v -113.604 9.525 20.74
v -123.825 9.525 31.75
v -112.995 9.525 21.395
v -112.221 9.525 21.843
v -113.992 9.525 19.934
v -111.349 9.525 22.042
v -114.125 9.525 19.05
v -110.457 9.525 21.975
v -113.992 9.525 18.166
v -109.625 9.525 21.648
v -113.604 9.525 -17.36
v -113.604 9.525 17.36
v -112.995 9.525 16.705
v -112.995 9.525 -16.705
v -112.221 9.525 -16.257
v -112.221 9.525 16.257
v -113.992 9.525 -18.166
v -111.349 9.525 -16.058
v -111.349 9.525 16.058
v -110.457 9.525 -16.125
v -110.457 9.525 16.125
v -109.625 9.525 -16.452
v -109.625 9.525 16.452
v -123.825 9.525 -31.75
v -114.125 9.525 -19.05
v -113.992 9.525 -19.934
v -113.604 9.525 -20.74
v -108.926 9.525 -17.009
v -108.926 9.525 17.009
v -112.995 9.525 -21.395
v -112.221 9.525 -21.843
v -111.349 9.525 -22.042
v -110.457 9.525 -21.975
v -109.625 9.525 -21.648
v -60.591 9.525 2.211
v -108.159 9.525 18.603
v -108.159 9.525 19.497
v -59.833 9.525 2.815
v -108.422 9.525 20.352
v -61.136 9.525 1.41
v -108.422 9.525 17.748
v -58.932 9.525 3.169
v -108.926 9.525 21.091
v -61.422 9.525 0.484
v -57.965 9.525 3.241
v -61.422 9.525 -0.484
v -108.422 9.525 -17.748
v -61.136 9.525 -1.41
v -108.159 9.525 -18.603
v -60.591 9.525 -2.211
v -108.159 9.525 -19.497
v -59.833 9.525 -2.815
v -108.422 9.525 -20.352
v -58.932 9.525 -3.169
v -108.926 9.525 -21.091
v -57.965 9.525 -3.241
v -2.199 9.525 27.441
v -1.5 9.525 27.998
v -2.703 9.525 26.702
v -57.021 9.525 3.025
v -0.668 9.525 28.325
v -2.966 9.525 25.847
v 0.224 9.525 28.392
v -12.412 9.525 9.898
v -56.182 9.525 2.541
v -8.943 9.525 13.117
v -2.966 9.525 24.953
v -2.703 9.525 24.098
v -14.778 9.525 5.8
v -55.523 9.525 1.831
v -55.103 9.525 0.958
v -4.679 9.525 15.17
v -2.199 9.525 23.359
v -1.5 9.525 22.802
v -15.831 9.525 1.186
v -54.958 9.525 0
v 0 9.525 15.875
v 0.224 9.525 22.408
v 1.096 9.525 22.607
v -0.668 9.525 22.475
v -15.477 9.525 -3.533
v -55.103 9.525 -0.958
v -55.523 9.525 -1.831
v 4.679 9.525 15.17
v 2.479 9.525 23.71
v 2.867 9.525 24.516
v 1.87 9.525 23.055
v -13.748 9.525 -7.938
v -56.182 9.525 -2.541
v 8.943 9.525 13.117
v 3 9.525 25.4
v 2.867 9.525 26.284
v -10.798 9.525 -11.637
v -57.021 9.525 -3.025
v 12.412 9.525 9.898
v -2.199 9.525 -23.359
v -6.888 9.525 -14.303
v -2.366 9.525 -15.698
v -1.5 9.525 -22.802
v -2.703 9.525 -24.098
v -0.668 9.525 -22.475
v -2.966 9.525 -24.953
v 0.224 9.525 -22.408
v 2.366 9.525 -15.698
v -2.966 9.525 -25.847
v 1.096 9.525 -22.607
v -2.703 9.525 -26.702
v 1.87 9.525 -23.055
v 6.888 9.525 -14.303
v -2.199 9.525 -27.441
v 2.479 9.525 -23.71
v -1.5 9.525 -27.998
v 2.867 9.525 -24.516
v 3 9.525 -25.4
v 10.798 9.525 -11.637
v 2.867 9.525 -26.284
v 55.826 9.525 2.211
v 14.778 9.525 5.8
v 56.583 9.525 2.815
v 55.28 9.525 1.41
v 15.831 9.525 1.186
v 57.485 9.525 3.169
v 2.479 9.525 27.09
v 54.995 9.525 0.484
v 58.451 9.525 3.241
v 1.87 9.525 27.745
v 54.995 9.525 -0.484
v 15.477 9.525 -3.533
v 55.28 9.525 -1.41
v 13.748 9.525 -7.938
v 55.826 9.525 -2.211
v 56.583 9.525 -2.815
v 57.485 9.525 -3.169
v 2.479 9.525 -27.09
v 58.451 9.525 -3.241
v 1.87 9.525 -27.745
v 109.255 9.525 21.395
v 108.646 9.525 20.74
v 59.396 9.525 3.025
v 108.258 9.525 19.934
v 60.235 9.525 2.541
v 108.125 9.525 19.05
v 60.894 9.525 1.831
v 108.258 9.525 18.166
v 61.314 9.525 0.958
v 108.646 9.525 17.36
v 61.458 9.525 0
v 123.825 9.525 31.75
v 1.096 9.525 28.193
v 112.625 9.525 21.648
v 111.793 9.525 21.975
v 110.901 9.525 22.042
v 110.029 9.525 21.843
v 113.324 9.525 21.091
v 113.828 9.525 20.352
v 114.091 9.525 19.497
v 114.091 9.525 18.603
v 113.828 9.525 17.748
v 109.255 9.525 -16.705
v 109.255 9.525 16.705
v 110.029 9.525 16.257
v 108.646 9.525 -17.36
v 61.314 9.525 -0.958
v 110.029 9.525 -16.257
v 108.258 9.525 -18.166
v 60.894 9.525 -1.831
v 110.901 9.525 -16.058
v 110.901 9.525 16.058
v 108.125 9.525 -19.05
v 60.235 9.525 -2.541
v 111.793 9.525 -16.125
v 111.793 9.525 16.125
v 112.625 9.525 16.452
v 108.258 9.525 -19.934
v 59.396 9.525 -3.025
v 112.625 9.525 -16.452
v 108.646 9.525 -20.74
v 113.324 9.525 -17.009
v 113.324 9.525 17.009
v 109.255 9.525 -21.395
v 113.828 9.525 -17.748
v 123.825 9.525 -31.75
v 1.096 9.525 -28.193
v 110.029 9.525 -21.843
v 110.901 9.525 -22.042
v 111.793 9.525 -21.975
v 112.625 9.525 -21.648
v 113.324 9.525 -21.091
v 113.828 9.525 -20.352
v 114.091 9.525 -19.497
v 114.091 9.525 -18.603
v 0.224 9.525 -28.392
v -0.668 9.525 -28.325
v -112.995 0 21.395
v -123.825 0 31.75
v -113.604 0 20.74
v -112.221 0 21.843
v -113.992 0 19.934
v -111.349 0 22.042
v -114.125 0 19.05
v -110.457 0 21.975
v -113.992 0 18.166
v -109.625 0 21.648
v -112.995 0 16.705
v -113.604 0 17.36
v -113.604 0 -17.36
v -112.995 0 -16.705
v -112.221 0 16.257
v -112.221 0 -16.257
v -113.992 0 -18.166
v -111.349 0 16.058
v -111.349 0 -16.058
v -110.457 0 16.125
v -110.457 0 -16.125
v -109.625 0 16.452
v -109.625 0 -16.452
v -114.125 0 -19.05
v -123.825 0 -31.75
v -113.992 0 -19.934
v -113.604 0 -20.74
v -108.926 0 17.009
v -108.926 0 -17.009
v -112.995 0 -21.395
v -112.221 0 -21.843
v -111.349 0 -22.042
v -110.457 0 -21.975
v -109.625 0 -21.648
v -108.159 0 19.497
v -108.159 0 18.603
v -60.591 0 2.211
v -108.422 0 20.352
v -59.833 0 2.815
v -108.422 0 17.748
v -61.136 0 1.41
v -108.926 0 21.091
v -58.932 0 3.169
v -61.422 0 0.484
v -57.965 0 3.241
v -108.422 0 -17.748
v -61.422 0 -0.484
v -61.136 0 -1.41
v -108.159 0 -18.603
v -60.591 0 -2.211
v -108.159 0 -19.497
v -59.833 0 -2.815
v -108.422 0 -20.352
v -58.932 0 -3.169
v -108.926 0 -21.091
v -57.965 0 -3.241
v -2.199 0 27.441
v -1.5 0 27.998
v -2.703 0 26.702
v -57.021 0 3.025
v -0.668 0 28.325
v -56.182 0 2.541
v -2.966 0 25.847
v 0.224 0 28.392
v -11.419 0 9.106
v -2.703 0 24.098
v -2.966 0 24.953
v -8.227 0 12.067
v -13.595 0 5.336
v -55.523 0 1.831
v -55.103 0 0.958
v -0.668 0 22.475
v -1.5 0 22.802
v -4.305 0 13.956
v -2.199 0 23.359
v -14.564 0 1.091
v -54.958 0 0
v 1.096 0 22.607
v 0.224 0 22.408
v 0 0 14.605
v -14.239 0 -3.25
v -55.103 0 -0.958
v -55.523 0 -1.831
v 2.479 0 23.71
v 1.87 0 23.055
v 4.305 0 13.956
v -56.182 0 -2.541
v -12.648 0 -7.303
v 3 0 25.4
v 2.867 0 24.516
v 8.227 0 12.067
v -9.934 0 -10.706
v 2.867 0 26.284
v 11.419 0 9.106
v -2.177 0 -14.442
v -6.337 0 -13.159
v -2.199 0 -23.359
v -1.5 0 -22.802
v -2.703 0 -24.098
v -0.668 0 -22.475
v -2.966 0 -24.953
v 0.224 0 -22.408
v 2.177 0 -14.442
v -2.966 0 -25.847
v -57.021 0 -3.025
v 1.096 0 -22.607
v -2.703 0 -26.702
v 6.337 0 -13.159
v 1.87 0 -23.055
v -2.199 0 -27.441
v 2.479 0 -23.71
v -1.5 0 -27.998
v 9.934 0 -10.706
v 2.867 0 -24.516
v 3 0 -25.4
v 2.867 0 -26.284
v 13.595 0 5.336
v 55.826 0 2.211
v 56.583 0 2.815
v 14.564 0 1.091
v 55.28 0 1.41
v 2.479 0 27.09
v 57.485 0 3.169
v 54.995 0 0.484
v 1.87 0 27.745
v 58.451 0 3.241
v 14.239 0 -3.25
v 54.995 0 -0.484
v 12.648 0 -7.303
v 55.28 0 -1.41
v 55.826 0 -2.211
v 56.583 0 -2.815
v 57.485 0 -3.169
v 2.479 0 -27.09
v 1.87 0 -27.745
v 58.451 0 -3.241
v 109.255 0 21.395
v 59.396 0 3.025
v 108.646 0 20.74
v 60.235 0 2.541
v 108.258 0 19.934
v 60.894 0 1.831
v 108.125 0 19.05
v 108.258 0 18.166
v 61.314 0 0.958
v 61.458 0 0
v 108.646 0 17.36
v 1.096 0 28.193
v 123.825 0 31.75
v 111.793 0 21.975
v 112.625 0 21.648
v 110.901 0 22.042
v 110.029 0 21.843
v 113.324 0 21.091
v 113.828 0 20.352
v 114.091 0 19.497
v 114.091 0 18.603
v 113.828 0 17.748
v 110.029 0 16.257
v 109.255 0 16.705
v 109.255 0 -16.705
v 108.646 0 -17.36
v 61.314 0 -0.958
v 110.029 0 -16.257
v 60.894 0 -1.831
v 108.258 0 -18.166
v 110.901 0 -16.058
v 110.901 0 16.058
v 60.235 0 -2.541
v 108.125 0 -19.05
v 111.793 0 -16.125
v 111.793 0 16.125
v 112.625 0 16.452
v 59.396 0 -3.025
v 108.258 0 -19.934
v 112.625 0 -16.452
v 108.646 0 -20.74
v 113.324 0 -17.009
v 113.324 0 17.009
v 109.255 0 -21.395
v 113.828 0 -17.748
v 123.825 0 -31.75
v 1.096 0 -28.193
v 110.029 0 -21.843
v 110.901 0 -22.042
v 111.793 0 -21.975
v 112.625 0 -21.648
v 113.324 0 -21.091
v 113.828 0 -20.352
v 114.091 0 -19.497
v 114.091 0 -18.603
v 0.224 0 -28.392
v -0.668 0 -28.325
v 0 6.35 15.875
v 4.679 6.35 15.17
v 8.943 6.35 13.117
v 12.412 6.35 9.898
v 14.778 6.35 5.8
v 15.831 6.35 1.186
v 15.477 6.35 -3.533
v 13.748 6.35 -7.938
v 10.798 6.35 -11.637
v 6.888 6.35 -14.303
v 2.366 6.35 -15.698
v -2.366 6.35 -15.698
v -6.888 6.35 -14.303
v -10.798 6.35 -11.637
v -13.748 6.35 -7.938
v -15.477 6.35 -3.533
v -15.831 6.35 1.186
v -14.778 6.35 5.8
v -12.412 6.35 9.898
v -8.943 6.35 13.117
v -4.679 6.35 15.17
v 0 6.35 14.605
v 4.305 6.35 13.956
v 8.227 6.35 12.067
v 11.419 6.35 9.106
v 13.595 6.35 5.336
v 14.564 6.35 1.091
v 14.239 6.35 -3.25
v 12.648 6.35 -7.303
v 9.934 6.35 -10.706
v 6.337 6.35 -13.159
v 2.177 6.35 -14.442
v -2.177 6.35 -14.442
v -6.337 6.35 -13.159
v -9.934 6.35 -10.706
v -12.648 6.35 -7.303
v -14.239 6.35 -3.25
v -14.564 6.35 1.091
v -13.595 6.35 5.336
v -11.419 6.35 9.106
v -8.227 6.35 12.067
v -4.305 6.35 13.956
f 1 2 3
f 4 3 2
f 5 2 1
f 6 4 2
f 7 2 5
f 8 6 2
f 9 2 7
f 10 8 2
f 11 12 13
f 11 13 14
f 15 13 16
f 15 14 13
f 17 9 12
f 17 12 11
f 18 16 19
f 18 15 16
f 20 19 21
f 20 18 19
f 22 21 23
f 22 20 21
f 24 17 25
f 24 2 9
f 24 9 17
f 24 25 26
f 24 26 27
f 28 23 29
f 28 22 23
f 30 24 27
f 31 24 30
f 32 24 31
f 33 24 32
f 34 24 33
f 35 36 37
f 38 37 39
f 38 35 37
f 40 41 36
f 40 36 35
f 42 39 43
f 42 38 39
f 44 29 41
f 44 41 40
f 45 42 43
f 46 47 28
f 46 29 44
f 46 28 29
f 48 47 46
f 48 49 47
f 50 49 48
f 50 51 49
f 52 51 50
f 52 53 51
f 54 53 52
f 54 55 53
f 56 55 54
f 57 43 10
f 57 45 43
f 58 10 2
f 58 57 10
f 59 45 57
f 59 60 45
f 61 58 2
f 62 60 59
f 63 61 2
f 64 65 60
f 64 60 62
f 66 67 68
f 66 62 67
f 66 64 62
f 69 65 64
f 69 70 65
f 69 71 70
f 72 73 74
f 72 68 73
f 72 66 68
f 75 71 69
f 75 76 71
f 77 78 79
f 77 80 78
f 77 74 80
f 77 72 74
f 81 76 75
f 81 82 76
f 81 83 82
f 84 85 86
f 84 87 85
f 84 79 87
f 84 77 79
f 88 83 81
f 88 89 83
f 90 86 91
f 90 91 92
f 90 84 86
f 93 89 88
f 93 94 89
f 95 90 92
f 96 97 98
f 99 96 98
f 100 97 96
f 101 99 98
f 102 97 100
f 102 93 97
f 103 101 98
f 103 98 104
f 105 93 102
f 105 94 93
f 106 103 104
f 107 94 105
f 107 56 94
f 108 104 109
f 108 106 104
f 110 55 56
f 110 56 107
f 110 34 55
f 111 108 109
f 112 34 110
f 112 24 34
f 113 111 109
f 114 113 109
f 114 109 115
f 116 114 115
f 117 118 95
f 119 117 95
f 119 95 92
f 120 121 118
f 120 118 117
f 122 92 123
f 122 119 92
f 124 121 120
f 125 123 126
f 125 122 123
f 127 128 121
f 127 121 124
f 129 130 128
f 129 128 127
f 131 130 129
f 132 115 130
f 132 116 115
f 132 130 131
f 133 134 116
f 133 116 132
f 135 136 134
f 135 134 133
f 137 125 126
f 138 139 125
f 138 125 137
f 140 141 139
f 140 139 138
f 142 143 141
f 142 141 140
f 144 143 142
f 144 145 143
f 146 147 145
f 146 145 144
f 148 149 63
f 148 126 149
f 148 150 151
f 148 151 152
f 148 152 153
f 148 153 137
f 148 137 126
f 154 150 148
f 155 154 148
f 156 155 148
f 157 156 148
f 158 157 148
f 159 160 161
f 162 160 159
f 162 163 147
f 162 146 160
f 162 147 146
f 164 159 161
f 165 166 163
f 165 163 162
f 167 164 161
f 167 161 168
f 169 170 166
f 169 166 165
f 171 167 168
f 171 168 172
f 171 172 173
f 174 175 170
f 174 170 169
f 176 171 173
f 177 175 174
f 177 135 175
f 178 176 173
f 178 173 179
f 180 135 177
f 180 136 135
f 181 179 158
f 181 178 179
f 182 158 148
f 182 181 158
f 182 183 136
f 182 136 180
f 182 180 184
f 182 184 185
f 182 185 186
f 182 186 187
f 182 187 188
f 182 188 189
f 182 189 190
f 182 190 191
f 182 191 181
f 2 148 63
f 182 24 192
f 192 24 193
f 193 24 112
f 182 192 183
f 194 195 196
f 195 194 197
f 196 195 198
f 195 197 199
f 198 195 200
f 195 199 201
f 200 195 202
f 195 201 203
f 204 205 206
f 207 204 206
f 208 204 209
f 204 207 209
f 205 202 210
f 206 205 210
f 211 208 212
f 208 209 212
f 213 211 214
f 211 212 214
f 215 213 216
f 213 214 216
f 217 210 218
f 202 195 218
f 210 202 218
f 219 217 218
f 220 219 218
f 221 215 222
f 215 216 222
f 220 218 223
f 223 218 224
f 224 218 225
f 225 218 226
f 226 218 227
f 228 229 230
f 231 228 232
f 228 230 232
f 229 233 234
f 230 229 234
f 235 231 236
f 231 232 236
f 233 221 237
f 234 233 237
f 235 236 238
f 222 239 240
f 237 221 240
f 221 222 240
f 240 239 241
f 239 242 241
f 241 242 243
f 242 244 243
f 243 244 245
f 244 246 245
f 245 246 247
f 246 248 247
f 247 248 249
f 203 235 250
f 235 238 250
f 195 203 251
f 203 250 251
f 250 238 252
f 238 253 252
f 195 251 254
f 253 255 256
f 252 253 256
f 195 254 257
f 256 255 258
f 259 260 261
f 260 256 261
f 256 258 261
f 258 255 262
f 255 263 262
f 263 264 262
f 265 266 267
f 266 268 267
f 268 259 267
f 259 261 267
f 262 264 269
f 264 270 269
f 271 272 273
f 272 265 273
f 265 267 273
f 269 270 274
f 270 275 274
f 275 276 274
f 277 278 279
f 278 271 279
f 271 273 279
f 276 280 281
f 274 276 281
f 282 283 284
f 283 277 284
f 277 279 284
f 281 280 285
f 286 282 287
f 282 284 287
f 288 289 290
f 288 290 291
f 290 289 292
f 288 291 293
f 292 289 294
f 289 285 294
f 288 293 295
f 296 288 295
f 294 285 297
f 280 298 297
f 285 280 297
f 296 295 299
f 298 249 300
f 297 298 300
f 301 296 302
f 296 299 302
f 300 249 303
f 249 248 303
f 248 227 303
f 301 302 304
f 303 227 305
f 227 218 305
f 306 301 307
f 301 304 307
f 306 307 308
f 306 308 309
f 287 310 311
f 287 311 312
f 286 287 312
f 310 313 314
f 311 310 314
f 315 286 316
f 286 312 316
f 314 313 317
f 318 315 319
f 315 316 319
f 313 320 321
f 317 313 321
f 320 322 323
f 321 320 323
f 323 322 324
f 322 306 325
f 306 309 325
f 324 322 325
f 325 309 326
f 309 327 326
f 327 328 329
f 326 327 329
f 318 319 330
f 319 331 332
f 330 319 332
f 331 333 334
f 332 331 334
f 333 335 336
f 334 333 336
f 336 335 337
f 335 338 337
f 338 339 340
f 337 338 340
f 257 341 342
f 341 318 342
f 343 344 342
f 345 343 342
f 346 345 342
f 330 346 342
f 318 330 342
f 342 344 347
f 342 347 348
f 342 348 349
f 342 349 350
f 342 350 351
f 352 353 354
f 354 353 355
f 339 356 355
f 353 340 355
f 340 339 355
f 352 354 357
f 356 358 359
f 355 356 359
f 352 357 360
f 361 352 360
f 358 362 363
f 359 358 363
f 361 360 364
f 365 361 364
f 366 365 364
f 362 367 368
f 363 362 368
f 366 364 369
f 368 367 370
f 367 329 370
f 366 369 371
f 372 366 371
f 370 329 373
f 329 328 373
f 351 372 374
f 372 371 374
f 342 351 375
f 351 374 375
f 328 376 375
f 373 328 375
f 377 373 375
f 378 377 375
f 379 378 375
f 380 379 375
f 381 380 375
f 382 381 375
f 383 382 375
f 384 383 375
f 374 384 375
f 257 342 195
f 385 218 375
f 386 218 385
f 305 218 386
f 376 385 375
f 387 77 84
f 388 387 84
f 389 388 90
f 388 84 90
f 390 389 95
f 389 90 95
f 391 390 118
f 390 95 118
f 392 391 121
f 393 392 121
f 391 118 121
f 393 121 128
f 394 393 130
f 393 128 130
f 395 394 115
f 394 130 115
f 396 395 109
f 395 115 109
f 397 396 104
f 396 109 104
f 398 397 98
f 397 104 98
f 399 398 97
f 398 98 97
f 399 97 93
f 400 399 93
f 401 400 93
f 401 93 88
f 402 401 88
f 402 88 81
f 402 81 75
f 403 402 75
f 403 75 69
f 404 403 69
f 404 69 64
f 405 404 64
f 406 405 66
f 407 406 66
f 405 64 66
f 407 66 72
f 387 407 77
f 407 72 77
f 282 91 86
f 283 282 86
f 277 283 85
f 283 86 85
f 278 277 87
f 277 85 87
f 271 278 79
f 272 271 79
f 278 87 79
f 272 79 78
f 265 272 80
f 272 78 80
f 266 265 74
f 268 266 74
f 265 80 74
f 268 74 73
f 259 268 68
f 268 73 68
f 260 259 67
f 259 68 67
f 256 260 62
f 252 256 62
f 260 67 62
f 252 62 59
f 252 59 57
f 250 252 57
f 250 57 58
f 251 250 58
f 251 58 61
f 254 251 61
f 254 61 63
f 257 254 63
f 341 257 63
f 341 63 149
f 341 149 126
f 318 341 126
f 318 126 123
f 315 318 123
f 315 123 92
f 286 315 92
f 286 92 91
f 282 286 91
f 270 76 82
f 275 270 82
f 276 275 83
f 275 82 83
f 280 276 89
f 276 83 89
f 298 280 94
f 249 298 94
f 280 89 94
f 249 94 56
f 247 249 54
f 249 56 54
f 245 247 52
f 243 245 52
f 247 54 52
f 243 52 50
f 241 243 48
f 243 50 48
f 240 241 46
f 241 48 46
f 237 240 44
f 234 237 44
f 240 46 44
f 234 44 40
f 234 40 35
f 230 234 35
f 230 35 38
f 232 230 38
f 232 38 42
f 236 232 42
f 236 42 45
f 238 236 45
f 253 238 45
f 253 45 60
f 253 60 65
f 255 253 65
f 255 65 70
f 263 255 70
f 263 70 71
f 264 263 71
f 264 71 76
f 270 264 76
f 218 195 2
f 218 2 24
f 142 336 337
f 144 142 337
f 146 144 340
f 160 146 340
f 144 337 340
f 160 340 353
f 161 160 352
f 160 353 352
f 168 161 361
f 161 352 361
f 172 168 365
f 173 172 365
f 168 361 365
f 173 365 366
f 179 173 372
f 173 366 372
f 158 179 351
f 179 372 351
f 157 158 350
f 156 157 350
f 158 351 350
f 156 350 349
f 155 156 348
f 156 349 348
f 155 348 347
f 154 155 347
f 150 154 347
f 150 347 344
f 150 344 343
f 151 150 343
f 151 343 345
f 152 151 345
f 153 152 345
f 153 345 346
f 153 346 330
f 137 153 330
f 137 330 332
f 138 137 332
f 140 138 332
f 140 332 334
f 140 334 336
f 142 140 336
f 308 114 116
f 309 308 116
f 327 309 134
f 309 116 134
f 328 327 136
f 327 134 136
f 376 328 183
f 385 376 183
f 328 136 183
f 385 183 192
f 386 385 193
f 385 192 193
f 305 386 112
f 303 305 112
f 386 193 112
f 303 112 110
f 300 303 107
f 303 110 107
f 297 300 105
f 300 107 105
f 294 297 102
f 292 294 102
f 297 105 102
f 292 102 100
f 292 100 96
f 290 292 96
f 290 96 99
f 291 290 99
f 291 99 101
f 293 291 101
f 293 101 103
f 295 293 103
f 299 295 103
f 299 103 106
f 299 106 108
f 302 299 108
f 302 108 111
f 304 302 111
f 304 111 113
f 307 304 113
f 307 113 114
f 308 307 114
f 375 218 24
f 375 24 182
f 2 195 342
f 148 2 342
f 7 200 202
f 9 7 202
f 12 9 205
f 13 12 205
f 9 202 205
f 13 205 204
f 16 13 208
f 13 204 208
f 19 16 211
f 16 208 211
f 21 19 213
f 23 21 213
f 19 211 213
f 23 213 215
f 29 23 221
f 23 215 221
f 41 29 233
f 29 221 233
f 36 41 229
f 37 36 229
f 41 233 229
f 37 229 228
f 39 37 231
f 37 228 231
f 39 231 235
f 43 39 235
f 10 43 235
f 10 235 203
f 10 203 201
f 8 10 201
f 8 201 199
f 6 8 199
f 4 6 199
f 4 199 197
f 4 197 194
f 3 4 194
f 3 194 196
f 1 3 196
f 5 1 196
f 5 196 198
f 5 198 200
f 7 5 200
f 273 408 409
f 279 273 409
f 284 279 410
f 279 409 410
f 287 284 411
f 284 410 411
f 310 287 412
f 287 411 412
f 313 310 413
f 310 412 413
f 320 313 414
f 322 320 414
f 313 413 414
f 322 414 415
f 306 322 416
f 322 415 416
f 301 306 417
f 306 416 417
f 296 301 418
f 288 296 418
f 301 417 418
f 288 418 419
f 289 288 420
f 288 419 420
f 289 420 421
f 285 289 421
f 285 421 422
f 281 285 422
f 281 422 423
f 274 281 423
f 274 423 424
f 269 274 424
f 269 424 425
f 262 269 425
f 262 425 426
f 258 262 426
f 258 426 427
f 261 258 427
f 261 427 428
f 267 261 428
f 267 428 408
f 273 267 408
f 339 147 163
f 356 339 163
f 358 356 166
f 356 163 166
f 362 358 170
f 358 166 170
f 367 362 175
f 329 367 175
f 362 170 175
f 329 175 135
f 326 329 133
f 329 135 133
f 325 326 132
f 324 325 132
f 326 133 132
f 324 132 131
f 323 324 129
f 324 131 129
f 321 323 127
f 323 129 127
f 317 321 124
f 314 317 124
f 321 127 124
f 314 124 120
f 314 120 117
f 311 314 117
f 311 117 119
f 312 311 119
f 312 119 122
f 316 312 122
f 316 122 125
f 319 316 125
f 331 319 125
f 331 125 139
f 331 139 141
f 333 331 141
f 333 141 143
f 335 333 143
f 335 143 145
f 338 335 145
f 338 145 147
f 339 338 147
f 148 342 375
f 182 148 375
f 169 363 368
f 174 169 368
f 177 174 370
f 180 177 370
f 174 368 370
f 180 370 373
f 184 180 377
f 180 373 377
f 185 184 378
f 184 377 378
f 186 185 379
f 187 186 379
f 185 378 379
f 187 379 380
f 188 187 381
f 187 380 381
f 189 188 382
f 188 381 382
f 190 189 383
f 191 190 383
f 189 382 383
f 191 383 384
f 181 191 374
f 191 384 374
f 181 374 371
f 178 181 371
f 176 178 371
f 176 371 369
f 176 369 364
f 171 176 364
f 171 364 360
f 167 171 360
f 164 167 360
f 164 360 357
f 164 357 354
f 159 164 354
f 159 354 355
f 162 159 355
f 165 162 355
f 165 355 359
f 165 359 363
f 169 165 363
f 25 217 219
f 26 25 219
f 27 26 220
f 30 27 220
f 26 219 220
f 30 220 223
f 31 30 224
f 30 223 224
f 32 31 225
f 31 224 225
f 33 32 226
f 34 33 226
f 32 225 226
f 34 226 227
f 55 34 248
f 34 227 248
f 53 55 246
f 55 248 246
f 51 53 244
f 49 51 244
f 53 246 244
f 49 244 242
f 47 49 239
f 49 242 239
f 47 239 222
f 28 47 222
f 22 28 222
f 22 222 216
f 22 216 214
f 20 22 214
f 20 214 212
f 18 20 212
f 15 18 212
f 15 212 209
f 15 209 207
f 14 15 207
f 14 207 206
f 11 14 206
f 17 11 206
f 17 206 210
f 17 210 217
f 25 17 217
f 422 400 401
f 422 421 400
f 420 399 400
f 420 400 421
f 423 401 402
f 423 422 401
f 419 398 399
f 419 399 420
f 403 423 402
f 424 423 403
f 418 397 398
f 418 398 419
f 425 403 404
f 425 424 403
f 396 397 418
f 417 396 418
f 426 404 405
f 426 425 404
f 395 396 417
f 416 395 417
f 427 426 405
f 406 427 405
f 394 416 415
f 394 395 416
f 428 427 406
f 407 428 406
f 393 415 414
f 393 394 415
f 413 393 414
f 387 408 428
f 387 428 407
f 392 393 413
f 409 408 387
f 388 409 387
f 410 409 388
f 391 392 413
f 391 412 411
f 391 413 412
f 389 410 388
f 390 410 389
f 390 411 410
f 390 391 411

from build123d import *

# Parameters (mm, degrees)
SKETCH1_W                  = 247.65
SKETCH1_H                  = 63.5
BOSS_EXTRUDE1_DEPTH        = 9.525
SKETCH3_R                  = 14.605
CUT_EXTRUDE1_DEPTH         = 129.185095662
F_6_0_6_DIAMETER_HOLE1_D   = 6
F_6_5_6_5_DIAMETER_HOLE3_D = 6.5
SKETCH29_R                 = 15.875
CUT_EXTRUDE5_DEPTH         = 3.175
F_6_0_6_DIAMETER_HOLE3_D   = 6


with BuildPart() as part:
    # Sketch1 → Boss-Extrude1 (new body)
    with BuildSketch(Plane(origin=(0, 0, 0), x_dir=(1, 0, 0), z_dir=(0, 1, 0))):
        Rectangle(SKETCH1_W, SKETCH1_H)
    extrude(amount=BOSS_EXTRUDE1_DEPTH)

    # Sketch3 → Cut-Extrude1 (cut, through all)
    with BuildSketch(Plane(origin=(0, 9.525, 0), x_dir=(1, 0, 0), z_dir=(0, 1, 0))):
        with Locations(Location((0, 0, 0), (0, 0, 270))):
            Circle(SKETCH3_R)
    extrude(amount=-CUT_EXTRUDE1_DEPTH, mode=Mode.SUBTRACT)

    # Ø6.0 (6) Diameter Hole1 (through all)
    with Locations(Plane(origin=(0, 0, 0), x_dir=(-1, 0, 0), z_dir=(0, -1, 0))):
        with Locations((0, -25.4), (0, 25.4)):
            Hole(F_6_0_6_DIAMETER_HOLE1_D / 2)

    # Ø6.5 (6.5) Diameter Hole3 (through all)
    with Locations(Plane(origin=(0, 0, 0), x_dir=(-1, 0, 0), z_dir=(0, -1, 0))):
        with Locations((58.208333333, 0), (-58.208333333, 0)):
            Hole(F_6_5_6_5_DIAMETER_HOLE3_D / 2)

    # Sketch29 → Cut-Extrude5 (cut)
    with BuildSketch(Plane(origin=(0, 9.525, 0), x_dir=(1, 0, 0), z_dir=(0, 1, 0))):
        with Locations(Location((0, 0, 0), (0, 0, 270))):
            Circle(SKETCH29_R)
    extrude(amount=-CUT_EXTRUDE5_DEPTH, mode=Mode.SUBTRACT)

    # Ø6.0 (6) Diameter Hole3 (through all)
    with Locations(Plane(origin=(0, 9.525, 0), x_dir=(1, 0, 0), z_dir=(0, 1, 0))):
        with Locations((-111.125, 19.05), (-111.125, -19.05), (111.125, -19.05), (111.125, 19.05)):
            Hole(F_6_0_6_DIAMETER_HOLE3_D / 2)


solid = part.part
